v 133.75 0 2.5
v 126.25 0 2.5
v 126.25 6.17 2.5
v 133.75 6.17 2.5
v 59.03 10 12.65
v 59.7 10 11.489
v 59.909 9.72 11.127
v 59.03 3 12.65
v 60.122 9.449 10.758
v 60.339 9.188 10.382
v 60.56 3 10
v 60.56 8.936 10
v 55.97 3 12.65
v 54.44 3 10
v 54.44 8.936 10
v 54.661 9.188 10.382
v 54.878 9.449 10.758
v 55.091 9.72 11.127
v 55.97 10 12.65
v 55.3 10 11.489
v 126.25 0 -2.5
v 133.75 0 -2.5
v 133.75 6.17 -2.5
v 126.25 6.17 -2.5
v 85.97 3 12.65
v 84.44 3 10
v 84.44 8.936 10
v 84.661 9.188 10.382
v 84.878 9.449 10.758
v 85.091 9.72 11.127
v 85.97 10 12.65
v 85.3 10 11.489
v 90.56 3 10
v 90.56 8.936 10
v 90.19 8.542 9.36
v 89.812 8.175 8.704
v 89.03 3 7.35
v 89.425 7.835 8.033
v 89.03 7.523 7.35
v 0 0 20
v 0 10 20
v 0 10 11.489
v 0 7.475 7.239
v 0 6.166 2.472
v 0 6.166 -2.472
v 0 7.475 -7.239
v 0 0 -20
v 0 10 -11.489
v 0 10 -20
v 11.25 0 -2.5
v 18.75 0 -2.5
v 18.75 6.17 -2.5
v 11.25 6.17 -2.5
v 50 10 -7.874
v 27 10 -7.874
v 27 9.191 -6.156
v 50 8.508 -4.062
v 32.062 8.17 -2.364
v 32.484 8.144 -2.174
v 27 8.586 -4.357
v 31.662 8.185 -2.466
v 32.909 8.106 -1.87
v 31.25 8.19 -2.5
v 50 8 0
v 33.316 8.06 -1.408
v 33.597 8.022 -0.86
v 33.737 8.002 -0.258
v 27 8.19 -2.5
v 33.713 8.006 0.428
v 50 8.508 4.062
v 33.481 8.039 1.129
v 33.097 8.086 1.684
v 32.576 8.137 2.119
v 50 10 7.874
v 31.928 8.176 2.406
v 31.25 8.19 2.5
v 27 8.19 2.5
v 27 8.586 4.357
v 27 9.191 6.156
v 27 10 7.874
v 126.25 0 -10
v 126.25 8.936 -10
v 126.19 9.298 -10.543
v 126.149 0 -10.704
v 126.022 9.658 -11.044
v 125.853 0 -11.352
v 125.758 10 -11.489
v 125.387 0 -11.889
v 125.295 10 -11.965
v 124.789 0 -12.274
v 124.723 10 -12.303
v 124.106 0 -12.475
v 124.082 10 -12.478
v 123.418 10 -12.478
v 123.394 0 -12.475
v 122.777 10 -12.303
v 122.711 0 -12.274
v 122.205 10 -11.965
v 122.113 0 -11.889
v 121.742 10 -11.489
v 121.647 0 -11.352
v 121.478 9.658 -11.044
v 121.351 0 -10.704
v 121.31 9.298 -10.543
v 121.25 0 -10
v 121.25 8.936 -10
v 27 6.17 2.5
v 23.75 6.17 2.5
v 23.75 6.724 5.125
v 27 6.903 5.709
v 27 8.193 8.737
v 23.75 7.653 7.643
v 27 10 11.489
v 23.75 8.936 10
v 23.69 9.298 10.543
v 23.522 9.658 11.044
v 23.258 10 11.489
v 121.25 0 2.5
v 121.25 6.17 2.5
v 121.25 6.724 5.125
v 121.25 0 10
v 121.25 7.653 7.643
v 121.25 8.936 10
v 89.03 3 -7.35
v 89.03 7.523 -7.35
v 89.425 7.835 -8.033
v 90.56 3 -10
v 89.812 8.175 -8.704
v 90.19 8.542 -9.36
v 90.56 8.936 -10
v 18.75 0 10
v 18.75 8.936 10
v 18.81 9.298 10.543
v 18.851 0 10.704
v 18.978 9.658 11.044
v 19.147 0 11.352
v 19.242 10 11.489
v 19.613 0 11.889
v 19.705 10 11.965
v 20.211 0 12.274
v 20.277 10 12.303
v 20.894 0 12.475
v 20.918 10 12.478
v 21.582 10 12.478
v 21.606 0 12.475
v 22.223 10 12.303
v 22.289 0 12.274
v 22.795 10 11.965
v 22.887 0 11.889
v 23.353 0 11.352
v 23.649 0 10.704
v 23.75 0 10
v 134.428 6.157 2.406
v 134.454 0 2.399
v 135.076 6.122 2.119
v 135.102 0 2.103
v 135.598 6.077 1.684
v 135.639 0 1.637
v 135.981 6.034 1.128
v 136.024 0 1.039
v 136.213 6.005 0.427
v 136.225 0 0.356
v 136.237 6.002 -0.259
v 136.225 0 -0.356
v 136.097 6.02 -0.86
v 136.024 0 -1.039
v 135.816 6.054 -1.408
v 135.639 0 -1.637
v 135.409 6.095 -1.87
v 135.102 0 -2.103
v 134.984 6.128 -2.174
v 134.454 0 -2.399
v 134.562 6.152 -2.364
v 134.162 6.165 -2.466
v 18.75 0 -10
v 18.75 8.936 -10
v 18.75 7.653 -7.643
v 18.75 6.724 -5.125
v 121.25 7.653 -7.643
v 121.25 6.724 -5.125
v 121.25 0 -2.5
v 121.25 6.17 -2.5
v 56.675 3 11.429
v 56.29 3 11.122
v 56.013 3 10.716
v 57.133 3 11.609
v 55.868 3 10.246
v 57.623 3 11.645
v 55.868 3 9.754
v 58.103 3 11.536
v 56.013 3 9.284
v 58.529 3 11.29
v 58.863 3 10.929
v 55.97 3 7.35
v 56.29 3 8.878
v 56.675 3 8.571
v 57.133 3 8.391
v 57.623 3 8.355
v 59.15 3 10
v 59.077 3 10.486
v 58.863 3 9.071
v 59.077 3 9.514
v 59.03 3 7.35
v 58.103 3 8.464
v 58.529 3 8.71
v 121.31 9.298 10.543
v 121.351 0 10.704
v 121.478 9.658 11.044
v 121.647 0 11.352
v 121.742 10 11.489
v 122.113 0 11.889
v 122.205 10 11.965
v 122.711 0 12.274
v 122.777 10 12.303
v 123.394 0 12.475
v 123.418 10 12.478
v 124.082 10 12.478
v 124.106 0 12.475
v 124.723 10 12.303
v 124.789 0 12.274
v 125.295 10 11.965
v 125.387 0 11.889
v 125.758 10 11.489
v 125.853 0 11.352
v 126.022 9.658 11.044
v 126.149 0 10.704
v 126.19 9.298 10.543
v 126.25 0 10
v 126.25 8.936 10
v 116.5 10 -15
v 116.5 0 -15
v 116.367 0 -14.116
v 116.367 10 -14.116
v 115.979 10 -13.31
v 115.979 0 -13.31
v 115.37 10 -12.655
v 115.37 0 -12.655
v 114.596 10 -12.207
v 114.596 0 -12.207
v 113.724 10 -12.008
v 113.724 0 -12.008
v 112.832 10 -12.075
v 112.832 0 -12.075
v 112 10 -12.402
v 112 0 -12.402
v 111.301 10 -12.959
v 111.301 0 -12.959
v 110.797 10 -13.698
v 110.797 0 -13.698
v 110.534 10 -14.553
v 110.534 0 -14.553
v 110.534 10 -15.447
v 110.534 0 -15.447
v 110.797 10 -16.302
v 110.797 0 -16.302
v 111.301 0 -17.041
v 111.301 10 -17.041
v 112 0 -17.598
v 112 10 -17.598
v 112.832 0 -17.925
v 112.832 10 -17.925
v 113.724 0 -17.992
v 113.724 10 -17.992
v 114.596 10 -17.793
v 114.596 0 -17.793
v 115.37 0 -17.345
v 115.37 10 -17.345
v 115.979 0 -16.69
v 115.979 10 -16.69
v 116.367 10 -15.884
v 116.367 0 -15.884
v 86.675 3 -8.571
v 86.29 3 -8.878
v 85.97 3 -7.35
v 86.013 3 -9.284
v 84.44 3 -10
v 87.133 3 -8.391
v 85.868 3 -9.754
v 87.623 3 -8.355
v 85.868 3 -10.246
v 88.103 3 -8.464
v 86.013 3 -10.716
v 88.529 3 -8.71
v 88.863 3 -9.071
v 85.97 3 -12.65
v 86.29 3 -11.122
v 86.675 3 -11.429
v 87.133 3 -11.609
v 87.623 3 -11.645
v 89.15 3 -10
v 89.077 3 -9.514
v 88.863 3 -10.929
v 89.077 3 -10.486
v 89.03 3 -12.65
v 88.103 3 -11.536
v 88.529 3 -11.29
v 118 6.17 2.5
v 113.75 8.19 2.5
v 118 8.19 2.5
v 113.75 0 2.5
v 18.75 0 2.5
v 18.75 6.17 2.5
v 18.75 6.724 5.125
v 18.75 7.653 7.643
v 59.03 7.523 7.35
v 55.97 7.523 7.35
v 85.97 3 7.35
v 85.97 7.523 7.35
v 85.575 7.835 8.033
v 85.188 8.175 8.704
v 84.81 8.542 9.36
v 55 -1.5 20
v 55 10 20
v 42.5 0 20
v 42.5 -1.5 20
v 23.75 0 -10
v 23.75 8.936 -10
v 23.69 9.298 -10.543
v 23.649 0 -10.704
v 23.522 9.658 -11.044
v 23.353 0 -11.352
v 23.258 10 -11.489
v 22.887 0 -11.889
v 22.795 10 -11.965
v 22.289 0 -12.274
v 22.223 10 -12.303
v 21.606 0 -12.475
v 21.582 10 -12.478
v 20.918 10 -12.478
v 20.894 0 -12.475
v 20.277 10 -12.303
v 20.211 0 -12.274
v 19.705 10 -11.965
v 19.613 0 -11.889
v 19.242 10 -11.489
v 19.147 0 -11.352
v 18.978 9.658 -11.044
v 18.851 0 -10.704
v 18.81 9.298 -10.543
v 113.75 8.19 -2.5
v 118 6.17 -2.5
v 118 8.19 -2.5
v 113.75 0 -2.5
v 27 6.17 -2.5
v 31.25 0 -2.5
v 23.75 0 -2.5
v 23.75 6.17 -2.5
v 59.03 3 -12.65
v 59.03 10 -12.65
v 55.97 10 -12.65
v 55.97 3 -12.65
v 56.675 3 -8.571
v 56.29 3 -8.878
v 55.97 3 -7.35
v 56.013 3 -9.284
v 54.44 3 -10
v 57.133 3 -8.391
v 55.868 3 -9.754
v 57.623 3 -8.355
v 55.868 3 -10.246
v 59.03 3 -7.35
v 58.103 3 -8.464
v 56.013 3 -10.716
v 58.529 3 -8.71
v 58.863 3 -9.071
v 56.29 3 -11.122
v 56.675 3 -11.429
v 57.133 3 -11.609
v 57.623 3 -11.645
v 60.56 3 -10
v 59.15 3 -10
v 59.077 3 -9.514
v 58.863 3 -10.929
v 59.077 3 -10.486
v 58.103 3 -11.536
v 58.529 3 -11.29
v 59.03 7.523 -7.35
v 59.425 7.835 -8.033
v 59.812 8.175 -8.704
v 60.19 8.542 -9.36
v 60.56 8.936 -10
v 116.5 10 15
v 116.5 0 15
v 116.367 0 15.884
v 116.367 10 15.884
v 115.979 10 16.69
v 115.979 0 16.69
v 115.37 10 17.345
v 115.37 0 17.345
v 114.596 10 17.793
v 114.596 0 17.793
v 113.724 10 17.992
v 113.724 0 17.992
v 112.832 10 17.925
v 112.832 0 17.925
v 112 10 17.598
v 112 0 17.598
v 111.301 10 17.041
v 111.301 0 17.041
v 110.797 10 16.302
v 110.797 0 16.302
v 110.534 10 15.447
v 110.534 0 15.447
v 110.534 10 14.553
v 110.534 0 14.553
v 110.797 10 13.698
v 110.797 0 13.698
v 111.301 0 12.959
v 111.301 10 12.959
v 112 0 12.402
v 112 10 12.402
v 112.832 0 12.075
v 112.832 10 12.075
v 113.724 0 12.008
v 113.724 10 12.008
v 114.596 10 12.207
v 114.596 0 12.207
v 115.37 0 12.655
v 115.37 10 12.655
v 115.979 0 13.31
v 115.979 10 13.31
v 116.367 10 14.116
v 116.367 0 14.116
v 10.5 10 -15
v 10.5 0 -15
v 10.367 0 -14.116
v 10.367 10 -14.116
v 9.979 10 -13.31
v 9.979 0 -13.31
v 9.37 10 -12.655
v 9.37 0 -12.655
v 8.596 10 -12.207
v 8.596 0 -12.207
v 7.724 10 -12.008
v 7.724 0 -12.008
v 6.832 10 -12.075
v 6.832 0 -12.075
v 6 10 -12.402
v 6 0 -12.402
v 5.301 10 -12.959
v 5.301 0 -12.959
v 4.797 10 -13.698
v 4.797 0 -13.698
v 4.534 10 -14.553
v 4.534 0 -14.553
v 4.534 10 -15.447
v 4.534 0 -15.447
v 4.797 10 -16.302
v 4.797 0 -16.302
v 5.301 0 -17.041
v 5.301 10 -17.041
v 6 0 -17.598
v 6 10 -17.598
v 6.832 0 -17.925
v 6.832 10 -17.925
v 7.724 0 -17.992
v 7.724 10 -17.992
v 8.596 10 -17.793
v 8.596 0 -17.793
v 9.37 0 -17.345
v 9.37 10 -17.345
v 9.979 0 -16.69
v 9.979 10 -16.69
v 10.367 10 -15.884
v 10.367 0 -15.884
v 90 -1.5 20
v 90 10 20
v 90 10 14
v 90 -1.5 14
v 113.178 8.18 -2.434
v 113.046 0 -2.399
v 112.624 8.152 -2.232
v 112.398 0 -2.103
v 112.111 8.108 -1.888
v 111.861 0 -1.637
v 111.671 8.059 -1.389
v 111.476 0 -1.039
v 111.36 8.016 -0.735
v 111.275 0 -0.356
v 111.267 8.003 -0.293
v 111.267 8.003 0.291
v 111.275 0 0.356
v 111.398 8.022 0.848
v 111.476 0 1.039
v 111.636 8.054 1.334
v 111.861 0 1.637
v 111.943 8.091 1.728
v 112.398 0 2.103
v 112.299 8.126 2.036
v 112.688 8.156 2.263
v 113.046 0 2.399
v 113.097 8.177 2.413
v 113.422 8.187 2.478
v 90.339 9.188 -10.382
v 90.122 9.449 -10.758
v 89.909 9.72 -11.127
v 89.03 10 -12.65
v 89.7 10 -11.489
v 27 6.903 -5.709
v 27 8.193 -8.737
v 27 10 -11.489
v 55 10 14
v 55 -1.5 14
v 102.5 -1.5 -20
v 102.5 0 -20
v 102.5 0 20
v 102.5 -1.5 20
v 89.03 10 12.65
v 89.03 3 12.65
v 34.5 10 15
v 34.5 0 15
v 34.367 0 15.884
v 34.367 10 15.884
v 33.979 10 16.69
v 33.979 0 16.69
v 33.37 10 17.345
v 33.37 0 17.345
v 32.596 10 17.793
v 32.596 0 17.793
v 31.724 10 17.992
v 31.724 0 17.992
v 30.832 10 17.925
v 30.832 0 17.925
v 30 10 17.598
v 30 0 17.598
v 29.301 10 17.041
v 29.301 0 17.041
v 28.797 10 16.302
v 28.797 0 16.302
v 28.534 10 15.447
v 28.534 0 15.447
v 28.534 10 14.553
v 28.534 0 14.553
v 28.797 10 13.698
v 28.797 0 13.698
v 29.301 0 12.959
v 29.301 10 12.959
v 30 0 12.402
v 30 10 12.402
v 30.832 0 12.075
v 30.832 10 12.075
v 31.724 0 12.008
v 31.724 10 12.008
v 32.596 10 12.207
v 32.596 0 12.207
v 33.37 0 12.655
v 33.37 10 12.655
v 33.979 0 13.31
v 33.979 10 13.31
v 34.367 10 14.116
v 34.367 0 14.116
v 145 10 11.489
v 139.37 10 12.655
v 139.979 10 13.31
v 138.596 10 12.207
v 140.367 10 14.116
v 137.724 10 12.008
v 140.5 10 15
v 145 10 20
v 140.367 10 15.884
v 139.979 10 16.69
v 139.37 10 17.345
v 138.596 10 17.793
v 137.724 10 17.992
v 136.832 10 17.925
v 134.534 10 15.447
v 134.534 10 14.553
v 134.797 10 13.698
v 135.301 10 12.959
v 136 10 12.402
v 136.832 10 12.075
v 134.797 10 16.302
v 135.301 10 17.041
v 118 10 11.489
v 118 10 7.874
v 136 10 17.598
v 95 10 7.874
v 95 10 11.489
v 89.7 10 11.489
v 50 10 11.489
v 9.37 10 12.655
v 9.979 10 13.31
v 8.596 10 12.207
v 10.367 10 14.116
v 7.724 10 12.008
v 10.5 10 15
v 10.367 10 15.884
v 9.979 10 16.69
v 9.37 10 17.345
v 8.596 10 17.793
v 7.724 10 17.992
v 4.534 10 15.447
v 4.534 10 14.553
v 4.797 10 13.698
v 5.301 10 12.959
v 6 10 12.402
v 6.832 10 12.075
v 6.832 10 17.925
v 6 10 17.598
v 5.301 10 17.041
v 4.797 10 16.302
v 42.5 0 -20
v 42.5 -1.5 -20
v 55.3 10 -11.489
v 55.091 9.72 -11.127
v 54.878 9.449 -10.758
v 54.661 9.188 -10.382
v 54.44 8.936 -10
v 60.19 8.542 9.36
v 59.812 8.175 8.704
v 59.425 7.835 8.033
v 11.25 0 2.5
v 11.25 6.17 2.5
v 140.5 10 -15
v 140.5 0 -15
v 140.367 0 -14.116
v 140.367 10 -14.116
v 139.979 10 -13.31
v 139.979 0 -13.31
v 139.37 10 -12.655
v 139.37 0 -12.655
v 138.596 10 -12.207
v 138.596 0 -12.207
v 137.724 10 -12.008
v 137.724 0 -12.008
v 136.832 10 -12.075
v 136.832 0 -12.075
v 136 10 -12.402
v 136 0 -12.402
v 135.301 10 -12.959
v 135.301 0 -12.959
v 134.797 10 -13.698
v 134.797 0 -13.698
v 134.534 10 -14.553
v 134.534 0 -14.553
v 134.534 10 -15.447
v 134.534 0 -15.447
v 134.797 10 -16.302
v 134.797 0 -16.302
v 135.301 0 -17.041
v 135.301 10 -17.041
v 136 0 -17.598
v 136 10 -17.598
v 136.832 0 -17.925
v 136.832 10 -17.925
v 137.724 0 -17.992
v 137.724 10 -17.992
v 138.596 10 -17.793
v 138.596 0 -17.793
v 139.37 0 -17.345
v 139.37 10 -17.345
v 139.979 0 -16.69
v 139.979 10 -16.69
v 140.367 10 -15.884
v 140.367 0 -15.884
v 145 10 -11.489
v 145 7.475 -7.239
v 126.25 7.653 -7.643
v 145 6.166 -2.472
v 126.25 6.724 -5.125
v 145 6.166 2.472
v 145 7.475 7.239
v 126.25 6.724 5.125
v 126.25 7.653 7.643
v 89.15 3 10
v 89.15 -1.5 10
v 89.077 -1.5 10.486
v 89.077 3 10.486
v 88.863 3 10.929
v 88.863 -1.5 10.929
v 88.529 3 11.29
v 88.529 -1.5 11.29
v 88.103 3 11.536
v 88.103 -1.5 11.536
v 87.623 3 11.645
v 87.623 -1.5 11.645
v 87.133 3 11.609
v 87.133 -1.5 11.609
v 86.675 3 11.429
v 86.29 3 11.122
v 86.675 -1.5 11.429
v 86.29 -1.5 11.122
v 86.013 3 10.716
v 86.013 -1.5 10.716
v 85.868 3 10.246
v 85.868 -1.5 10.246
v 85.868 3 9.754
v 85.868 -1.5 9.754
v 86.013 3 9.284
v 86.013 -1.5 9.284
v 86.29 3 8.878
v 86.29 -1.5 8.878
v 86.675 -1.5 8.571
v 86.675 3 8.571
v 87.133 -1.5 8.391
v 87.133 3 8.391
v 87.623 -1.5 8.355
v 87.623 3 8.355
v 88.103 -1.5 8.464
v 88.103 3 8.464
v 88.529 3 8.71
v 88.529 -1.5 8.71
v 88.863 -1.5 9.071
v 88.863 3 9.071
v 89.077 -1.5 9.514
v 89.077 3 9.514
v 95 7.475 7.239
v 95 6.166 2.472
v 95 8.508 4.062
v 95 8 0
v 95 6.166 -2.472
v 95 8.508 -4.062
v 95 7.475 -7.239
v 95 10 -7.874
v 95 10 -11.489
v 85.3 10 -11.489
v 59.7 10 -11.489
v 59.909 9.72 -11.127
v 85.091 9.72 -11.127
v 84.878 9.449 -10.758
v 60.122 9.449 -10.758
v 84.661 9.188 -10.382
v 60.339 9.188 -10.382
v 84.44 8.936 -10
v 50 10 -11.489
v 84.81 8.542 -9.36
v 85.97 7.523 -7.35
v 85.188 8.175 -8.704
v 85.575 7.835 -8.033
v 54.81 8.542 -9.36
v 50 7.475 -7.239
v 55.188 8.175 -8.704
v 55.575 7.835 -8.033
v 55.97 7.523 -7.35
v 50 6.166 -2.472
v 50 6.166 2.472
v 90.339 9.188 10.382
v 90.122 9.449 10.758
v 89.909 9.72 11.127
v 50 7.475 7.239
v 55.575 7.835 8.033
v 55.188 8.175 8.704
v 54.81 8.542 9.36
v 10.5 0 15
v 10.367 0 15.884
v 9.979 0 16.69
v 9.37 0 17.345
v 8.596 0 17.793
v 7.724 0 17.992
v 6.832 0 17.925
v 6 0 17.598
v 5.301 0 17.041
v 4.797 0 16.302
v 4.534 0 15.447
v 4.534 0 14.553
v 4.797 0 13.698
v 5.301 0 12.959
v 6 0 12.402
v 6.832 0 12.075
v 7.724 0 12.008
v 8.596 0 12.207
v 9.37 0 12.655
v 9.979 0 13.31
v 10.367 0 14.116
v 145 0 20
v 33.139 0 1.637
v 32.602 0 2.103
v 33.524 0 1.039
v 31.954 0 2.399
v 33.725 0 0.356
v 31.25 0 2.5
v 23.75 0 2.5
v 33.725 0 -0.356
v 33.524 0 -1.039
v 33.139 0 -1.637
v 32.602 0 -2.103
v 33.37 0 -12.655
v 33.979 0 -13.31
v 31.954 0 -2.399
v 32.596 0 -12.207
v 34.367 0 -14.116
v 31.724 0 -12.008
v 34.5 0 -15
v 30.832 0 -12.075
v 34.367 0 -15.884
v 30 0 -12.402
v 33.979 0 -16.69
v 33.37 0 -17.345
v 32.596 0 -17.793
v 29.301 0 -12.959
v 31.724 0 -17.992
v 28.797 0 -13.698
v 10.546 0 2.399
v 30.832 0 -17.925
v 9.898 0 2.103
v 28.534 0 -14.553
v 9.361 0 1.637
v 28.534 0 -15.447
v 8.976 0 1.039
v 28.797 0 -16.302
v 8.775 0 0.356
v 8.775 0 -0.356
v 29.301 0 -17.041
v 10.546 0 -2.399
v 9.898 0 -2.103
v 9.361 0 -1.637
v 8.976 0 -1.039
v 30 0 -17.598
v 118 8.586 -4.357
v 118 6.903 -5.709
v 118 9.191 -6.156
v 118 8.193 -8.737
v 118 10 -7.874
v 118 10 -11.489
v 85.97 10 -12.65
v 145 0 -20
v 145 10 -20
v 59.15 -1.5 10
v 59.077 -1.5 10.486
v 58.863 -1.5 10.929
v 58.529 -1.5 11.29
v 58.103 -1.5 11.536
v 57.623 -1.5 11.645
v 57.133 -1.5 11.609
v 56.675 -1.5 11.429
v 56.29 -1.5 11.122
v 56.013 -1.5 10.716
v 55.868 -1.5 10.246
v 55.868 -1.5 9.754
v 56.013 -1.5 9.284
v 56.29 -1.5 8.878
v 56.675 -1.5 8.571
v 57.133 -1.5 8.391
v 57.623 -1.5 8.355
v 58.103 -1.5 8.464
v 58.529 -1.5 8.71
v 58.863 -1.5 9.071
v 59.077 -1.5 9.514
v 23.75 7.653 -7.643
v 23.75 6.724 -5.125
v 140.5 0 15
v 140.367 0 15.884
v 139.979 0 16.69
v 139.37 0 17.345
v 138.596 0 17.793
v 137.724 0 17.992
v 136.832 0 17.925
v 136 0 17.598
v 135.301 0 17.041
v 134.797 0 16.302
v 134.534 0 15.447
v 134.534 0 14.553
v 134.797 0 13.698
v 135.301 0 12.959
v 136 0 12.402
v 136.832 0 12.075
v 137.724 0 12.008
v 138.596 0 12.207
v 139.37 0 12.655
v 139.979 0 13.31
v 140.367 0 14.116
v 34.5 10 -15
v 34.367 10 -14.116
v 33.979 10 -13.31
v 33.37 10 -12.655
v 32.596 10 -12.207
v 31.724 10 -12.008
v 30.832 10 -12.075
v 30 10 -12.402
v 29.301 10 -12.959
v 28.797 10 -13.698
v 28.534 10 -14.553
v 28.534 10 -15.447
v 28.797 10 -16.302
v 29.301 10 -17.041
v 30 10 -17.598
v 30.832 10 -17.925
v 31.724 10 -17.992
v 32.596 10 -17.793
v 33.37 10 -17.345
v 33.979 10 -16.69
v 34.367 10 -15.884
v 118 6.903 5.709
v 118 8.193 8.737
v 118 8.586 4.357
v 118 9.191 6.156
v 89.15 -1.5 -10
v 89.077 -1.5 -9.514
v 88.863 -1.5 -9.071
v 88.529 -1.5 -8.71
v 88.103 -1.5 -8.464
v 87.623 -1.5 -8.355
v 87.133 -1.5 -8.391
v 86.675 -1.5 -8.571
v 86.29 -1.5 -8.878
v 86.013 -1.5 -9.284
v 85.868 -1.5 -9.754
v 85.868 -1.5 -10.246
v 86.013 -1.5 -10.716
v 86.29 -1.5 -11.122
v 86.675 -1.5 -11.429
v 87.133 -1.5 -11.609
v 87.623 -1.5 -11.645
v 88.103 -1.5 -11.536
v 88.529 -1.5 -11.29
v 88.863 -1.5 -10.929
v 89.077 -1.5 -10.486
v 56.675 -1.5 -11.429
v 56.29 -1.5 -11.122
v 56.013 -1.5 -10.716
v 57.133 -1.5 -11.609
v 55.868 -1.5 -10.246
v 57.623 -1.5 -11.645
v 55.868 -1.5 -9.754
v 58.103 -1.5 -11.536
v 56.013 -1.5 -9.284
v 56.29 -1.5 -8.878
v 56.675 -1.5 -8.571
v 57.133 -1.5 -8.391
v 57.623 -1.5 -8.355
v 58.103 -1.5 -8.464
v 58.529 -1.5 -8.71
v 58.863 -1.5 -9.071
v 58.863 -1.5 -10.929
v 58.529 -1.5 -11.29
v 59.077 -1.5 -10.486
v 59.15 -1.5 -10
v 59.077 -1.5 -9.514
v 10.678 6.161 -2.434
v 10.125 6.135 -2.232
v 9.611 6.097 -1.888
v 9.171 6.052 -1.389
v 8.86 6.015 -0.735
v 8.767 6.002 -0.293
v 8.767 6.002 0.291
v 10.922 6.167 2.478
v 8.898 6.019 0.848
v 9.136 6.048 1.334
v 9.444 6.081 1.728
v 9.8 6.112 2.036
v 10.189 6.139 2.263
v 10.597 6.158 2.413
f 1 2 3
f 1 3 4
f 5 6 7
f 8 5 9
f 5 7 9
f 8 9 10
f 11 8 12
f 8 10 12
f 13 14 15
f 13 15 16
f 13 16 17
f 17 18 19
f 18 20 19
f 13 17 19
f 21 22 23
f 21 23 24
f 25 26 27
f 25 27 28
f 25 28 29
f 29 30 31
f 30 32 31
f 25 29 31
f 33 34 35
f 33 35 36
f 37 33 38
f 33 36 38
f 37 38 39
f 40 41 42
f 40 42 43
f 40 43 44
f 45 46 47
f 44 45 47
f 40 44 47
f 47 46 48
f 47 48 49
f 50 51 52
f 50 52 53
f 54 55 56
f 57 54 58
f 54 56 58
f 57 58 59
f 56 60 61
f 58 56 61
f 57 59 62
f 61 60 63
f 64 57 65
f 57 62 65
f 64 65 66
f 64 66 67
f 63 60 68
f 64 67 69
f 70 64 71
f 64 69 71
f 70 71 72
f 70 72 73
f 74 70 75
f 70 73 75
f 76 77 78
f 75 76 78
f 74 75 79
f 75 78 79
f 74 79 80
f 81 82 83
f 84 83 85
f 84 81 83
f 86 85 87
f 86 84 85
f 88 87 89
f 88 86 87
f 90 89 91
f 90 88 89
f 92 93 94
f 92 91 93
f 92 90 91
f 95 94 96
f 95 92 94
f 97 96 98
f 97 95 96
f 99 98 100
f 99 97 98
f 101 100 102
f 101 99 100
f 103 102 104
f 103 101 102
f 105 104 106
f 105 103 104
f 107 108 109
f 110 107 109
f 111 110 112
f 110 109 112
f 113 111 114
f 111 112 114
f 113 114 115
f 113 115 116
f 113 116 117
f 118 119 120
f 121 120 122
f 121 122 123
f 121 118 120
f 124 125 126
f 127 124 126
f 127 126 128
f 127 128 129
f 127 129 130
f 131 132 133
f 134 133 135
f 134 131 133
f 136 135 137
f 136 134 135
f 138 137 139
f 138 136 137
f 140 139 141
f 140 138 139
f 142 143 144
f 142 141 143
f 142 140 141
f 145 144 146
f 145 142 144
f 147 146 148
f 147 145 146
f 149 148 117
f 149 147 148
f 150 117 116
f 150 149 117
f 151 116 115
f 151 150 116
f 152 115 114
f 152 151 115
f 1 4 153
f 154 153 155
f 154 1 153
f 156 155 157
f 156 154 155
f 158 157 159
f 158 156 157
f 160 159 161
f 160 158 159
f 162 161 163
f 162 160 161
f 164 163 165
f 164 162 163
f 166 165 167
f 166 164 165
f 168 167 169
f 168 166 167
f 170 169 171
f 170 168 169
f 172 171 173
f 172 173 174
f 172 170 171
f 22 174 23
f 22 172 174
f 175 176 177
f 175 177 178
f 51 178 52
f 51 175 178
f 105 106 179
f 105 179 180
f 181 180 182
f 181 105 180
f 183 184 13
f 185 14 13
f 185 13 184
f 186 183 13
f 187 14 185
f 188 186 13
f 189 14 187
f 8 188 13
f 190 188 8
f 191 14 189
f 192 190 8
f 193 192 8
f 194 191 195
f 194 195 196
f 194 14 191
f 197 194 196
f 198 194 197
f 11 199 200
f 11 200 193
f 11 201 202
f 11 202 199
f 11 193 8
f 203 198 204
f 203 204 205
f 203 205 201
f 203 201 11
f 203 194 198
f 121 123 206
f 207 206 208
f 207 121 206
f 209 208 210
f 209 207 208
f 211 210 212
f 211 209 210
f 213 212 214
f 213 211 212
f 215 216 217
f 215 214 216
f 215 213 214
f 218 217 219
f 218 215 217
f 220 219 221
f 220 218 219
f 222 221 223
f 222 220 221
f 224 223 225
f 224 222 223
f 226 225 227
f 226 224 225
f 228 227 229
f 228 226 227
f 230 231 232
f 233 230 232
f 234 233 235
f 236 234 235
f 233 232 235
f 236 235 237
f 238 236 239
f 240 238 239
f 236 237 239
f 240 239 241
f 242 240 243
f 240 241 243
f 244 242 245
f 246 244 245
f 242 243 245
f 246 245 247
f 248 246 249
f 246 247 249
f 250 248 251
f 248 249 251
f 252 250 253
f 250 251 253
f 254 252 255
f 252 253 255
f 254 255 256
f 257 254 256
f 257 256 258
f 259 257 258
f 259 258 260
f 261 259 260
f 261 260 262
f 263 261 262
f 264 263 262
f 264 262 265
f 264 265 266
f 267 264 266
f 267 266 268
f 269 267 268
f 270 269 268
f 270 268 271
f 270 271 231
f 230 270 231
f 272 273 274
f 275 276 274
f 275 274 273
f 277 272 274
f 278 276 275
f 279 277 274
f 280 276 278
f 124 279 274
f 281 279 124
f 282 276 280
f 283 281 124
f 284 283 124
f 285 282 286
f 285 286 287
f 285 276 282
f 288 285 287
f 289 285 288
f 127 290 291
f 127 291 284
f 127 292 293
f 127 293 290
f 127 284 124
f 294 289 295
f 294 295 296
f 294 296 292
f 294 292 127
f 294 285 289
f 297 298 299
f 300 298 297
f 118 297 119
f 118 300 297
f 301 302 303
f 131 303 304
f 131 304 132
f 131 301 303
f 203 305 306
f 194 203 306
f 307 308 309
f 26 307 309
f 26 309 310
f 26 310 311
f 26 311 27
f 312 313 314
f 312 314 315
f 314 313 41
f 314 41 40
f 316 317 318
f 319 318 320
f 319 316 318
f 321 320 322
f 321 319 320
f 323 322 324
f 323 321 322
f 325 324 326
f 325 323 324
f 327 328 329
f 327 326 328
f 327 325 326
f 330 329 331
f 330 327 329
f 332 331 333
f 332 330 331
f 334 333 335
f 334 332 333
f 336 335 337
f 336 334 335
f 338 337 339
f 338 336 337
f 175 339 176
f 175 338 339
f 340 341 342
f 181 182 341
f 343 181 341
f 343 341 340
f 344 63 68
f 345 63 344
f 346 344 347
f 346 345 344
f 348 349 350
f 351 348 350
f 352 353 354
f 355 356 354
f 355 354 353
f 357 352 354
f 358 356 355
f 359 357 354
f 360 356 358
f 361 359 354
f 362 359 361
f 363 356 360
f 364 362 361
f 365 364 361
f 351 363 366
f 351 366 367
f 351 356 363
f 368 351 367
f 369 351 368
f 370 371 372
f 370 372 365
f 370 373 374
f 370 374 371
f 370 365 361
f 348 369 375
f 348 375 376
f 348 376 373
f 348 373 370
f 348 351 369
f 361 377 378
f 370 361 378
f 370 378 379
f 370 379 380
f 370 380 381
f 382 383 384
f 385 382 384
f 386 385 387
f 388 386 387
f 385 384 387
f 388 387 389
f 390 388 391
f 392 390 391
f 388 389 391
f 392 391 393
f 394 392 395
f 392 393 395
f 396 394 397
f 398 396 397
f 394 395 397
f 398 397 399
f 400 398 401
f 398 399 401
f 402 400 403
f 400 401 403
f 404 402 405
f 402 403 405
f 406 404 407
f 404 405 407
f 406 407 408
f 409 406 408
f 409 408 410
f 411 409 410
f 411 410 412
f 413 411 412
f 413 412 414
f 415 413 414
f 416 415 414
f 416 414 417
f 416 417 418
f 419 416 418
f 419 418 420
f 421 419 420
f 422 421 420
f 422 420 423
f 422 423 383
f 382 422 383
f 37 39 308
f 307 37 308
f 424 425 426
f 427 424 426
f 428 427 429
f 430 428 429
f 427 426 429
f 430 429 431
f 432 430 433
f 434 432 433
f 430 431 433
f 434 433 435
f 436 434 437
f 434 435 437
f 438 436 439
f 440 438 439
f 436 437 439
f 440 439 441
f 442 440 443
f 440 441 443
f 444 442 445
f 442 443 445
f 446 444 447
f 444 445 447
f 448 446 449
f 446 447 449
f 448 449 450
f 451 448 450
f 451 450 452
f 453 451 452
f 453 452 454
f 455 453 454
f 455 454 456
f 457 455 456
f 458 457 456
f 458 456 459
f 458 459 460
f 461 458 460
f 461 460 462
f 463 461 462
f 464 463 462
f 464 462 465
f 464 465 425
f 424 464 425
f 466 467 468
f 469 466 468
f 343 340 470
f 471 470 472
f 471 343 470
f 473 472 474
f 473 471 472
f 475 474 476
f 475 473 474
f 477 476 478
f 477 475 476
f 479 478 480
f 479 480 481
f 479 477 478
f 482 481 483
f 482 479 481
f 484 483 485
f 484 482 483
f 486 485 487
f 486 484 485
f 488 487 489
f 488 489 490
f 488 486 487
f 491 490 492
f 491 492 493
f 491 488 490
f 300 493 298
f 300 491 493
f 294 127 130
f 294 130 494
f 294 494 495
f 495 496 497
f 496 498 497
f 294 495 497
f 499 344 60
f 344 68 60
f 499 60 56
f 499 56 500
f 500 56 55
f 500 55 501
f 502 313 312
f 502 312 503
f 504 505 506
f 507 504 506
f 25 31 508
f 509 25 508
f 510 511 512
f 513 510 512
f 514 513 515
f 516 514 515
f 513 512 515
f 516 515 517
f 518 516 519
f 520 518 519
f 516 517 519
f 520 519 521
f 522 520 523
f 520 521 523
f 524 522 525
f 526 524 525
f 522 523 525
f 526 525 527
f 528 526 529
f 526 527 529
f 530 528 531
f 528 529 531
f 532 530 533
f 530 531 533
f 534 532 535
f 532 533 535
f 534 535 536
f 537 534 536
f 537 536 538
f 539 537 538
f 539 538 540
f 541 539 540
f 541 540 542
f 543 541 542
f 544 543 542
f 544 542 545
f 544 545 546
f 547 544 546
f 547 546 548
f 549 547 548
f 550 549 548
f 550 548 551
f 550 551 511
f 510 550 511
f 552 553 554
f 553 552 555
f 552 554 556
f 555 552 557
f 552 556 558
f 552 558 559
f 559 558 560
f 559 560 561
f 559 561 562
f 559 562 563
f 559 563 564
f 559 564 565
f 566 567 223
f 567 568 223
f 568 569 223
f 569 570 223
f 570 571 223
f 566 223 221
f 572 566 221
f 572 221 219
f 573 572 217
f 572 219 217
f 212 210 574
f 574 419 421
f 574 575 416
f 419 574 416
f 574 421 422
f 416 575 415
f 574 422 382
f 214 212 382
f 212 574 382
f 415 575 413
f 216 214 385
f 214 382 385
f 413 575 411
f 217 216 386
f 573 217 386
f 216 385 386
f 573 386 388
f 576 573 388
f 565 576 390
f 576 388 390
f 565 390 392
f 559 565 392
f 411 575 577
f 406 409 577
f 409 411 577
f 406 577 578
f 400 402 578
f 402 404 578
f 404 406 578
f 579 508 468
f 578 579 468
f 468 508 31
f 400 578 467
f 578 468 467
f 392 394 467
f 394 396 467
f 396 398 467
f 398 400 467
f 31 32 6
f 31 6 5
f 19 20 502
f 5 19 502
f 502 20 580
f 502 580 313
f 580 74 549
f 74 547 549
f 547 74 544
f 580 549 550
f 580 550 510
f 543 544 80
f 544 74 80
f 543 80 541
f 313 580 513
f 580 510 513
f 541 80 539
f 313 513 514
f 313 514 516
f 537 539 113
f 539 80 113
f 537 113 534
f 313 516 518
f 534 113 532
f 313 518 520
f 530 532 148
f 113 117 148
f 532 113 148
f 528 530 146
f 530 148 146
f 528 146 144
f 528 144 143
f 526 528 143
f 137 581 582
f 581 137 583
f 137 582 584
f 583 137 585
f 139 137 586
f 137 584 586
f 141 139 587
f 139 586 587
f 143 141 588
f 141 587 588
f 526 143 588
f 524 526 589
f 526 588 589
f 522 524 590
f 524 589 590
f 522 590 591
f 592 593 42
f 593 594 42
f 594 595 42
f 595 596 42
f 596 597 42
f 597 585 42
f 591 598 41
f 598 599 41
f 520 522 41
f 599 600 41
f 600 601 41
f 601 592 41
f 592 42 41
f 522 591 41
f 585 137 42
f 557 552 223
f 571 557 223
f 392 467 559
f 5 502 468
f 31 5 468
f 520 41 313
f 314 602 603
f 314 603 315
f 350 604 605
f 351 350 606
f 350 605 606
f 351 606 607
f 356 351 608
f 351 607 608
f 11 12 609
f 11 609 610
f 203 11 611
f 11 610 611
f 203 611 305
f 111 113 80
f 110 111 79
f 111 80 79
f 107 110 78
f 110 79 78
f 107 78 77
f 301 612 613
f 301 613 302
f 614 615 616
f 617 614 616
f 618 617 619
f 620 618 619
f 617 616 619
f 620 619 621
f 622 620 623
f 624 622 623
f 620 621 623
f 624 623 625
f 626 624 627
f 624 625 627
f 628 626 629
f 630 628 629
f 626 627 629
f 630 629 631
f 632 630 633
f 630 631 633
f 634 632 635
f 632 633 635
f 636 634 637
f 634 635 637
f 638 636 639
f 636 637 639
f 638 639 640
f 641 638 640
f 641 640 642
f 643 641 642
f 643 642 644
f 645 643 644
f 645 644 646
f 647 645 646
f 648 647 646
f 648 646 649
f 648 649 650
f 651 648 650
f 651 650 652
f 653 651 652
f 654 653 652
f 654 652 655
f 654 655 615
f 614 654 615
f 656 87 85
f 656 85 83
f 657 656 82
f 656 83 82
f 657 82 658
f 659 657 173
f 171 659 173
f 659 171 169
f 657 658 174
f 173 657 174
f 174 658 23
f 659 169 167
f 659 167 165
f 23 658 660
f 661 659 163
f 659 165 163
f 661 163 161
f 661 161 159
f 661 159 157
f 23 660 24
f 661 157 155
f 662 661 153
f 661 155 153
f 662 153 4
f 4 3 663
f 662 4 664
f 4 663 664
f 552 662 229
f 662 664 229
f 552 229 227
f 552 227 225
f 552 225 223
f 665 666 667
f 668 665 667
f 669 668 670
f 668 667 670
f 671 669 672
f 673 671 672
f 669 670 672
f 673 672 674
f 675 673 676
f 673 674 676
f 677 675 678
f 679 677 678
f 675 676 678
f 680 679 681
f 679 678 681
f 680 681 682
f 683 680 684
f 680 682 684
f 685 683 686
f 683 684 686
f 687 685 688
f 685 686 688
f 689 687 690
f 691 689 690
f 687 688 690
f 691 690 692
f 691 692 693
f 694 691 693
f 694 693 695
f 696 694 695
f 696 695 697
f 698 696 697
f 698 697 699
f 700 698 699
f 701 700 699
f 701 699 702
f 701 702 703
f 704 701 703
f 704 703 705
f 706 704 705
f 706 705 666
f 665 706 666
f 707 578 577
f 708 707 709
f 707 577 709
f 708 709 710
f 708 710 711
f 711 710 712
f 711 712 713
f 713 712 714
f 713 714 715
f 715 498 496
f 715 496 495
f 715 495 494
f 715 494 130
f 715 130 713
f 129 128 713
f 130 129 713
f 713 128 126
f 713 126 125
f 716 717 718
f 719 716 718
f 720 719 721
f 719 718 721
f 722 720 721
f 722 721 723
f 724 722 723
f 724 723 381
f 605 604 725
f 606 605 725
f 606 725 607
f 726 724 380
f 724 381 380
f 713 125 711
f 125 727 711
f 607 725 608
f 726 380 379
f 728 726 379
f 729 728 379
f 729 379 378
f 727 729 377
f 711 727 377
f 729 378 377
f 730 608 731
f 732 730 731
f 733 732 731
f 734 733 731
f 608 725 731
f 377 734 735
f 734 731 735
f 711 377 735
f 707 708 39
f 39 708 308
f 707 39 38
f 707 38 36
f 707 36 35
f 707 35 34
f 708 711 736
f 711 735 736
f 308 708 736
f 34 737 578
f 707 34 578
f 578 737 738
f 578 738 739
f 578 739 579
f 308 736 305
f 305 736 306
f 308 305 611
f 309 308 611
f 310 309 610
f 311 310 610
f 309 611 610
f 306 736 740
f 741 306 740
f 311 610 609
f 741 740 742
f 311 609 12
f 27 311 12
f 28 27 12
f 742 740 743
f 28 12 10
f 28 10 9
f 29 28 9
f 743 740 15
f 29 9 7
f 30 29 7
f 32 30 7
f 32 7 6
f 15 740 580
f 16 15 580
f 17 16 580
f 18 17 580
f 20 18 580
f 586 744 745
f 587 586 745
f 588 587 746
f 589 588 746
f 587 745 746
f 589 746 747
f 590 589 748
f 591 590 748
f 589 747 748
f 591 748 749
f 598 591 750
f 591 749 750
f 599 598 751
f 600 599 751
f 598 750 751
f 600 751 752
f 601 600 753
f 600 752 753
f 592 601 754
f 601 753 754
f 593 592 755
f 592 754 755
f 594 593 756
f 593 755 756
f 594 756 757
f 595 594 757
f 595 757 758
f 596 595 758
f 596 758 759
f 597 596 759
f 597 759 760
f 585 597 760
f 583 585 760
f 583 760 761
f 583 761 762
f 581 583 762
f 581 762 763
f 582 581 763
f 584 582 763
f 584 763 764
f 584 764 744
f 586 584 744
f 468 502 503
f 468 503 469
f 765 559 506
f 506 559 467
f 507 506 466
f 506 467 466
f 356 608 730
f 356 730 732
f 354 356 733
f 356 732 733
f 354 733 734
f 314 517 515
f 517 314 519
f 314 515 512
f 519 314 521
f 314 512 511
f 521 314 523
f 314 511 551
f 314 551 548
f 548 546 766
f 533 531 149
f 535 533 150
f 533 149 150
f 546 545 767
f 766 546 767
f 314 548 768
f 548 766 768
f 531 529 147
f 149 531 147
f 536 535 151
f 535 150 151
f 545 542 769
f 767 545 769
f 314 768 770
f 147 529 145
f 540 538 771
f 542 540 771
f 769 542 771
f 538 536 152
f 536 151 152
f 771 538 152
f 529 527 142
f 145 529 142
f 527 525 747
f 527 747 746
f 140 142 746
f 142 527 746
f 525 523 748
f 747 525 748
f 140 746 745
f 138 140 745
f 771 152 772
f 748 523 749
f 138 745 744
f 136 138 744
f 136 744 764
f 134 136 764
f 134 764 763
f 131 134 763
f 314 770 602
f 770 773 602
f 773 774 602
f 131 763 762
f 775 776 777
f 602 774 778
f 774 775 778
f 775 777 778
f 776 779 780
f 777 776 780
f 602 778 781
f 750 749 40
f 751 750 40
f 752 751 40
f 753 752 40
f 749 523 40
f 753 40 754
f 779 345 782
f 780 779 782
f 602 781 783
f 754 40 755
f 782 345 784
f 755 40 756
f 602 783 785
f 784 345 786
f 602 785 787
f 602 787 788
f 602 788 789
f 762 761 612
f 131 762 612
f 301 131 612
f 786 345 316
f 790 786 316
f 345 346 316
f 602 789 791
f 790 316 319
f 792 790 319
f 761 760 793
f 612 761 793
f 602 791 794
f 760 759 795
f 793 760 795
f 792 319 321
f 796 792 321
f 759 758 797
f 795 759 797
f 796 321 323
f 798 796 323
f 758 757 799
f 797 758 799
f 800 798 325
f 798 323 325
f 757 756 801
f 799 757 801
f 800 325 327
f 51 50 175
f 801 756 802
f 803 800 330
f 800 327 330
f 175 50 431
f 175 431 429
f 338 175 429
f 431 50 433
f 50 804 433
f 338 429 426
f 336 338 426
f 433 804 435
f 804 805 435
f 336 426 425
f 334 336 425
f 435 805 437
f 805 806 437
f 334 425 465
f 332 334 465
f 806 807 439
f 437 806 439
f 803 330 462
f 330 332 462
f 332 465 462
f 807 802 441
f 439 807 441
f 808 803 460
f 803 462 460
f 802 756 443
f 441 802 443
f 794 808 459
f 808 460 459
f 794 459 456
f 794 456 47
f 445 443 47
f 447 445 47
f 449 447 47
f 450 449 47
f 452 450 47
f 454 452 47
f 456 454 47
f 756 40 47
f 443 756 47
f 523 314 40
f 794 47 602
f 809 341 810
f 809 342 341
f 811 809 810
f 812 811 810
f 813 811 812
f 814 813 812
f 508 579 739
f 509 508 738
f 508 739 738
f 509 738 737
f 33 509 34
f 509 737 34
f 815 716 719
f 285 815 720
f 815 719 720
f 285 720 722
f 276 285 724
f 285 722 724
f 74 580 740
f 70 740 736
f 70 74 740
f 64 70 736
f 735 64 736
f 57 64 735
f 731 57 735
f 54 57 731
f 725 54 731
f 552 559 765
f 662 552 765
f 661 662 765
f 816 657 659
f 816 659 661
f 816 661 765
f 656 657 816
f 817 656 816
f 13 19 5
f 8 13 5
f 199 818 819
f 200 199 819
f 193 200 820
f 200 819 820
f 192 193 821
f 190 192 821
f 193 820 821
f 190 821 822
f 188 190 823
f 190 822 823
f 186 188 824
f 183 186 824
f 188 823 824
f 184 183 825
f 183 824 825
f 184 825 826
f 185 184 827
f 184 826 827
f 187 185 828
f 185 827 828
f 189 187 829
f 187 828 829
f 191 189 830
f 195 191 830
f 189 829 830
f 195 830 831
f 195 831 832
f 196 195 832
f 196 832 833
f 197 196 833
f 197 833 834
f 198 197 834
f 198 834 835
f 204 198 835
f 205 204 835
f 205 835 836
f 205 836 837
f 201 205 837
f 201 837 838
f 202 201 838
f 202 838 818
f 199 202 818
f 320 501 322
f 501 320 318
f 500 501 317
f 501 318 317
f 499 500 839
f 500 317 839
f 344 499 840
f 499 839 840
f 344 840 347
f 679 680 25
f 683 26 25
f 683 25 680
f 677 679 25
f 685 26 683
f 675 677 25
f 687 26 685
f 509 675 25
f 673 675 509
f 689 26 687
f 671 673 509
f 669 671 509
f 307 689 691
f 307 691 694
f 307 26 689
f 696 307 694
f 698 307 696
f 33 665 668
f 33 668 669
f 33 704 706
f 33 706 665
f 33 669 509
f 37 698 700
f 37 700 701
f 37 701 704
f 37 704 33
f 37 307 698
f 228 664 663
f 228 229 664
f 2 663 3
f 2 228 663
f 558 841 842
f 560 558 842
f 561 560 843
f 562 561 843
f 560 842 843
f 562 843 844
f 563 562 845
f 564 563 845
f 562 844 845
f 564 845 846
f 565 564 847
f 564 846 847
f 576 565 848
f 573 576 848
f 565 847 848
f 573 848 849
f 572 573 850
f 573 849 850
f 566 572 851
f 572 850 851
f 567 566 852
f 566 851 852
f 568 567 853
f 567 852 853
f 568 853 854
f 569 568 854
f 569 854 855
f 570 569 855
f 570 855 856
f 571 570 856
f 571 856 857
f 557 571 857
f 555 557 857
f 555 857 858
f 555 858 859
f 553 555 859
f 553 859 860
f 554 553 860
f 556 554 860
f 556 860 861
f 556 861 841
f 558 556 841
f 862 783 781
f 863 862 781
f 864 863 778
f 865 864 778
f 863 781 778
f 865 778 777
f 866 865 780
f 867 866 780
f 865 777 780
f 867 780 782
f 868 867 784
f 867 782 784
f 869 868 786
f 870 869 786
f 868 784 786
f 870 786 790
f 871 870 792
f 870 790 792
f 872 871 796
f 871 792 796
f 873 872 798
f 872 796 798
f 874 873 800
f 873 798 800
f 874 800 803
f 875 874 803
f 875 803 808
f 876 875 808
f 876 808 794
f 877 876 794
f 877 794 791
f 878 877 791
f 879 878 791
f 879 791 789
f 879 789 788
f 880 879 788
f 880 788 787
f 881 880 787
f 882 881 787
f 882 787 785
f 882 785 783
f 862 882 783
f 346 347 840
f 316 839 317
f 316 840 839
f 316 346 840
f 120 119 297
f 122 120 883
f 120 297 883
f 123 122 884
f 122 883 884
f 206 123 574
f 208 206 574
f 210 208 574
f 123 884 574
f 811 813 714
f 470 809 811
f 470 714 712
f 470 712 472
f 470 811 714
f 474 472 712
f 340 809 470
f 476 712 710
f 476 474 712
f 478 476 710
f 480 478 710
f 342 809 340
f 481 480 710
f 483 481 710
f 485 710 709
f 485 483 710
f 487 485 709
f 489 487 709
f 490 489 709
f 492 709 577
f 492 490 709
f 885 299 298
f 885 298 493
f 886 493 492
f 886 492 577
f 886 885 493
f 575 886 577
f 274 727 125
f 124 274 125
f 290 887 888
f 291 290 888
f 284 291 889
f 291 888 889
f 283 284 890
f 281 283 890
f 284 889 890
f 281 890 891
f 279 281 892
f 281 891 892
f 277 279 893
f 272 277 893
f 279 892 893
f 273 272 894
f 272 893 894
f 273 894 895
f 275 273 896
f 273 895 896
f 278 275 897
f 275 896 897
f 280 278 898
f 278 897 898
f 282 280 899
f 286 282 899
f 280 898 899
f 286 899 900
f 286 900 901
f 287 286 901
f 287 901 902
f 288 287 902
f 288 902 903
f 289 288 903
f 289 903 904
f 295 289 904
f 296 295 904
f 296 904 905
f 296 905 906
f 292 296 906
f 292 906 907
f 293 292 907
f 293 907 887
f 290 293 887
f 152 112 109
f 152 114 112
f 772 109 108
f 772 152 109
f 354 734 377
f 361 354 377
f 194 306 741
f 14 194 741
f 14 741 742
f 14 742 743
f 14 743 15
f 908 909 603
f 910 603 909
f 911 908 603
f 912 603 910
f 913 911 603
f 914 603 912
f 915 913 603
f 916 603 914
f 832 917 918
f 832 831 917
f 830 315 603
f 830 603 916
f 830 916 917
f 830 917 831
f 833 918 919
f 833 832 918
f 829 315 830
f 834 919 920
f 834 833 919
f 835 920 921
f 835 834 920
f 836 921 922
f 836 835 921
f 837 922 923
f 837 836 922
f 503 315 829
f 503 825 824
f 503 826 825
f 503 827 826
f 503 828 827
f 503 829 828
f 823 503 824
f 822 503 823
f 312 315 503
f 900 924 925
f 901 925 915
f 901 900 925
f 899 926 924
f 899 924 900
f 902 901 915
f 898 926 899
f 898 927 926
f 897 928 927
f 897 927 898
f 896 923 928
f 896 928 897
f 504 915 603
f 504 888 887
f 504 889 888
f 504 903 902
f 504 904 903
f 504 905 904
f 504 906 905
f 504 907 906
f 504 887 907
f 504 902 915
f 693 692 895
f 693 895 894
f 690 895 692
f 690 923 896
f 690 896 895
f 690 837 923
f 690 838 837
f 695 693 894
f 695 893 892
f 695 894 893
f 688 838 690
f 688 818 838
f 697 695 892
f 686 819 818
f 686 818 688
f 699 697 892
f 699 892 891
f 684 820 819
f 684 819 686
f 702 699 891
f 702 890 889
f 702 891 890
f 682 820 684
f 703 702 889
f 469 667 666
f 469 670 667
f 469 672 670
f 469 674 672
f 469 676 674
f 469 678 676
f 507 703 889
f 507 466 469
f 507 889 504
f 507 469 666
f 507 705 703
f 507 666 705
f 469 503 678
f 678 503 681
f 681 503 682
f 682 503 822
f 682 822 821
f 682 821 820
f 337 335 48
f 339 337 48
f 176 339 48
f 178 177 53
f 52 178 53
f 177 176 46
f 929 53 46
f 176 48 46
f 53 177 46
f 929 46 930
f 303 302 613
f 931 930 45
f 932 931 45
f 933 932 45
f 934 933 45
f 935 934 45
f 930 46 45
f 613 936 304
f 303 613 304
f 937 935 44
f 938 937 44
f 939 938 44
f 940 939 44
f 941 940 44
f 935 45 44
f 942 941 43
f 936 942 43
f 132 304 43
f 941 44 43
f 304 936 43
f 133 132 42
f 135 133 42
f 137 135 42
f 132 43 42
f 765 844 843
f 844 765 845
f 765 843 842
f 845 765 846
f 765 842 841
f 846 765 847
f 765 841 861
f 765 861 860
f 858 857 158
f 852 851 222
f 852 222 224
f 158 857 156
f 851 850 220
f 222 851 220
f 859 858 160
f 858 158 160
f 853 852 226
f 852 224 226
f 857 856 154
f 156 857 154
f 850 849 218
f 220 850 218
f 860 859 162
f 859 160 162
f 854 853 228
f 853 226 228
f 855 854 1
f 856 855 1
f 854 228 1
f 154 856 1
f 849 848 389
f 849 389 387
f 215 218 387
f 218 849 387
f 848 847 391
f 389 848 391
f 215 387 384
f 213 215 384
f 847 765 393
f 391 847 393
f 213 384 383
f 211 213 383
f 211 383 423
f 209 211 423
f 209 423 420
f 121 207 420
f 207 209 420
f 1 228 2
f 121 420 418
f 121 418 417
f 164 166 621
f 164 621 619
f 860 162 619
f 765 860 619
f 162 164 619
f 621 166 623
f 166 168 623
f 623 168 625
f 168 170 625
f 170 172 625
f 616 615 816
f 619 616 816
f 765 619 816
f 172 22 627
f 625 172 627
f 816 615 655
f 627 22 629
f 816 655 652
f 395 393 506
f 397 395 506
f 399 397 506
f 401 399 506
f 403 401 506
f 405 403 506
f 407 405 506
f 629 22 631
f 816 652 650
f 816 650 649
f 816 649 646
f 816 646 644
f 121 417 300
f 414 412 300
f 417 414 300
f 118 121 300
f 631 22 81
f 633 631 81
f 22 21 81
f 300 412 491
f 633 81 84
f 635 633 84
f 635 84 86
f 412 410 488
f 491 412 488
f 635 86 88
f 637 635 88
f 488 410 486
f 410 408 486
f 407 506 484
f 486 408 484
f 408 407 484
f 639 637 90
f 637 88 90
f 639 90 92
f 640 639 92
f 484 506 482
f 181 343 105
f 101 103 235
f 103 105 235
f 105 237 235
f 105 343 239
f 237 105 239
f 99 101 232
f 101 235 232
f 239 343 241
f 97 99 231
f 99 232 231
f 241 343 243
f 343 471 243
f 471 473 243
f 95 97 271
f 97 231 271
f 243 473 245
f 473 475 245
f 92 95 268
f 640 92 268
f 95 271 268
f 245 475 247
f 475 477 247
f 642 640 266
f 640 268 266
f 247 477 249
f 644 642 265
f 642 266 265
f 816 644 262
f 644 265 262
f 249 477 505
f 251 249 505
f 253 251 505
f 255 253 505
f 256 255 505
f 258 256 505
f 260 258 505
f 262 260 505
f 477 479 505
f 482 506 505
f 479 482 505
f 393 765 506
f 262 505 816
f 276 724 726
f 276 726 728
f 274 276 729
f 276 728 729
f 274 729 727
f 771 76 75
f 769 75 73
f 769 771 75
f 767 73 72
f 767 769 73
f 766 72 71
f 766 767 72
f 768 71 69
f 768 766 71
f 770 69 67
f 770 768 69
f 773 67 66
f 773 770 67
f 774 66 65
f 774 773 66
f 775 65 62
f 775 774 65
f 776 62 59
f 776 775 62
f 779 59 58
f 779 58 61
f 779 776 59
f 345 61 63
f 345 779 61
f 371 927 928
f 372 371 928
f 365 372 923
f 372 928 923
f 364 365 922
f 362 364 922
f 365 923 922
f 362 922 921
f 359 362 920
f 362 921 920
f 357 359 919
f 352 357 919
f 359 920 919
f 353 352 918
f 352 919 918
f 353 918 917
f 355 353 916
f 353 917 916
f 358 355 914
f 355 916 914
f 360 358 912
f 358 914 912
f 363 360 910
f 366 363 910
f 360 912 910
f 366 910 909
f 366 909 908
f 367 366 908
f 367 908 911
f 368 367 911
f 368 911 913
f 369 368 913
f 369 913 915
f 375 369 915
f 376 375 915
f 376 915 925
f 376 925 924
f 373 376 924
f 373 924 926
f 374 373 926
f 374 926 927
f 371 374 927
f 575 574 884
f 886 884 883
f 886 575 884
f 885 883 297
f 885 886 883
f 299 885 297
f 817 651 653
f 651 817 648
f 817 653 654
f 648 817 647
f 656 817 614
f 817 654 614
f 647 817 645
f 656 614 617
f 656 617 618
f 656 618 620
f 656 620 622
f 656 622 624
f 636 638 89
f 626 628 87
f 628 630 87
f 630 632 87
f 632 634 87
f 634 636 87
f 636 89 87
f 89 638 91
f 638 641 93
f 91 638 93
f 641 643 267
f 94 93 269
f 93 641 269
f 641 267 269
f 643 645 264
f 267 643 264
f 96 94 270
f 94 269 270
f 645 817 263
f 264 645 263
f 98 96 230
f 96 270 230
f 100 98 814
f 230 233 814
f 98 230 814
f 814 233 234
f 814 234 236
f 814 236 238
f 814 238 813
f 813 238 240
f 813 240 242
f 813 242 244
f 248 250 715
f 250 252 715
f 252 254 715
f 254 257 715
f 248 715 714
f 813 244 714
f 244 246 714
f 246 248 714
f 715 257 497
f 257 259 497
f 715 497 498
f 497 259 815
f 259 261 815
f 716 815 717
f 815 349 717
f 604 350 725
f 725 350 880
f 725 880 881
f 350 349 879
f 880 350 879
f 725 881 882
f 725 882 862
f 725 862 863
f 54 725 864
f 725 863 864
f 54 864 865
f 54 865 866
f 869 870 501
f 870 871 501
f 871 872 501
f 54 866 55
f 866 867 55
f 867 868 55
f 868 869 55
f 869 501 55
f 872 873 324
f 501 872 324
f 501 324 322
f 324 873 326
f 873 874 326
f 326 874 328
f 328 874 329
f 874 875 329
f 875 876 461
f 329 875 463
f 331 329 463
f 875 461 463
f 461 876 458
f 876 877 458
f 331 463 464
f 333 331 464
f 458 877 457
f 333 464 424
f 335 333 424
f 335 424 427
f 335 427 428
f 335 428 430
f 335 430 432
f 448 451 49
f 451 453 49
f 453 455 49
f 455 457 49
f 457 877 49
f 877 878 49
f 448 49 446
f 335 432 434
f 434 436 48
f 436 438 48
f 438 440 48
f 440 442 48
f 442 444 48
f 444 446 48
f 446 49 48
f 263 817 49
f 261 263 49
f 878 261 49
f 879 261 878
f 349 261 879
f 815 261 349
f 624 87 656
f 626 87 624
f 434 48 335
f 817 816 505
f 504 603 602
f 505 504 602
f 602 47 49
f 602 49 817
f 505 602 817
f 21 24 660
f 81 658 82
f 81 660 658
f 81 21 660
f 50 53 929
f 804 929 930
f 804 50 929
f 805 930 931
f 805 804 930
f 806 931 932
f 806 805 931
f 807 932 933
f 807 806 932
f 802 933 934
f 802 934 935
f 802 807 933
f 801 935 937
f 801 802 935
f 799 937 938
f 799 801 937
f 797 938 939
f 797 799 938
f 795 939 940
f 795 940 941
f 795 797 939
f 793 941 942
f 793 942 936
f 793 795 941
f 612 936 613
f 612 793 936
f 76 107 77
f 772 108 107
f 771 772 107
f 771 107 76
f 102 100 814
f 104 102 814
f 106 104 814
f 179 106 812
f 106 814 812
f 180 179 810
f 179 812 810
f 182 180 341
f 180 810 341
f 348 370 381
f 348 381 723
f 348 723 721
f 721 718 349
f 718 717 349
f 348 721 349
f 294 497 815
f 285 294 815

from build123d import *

# Parameters (mm, degrees)
EXTRUDE_1_DEPTH     = 145
SKETCH_2_R          = 3
CUT_EXTRUDE_1_DEPTH = 11
EXTRUDE_2_DEPTH     = 23
SKETCH_4_W          = 60
SKETCH_4_H          = 40
EXTRUDE_3_DEPTH     = 1.5
SKETCH_5_R          = 1.65
CUT_EXTRUDE_2_DEPTH = 12.5
CUT_EXTRUDE_3_DEPTH = 7
SKETCH_8_W          = 35
SKETCH_8_H          = 6
CUT_EXTRUDE_5_DEPTH = 12.5
CUT_EXTRUDE_6_DEPTH = 11


with BuildPart() as part:
    # 草图1 → 凸台-拉伸1 (new body)
    with BuildSketch(Plane(origin=(0, 0, 0), x_dir=(0, 0, -1), z_dir=(1, 0, 0))):
        with BuildLine():
            Line((-20, 10), (-20, 0))
            Line((-20, 0), (20, 0))
            Line((20, 0), (20, 10))
            Line((20, 10), (11.489125293, 10))
            ThreePointArc((11.489125293, 10), (0, 6), (-11.489125293, 10))
            Line((-11.489125293, 10), (-20, 10))
        make_face()
    extrude(amount=EXTRUDE_1_DEPTH)

    # 草图2 → 切除-拉伸1 (cut, through all)
    with BuildSketch(Plane.XZ):
        with Locations((137.5, -15)):
            Circle(SKETCH_2_R)
        with Locations((113.5, -15)):
            Circle(SKETCH_2_R)
        with Locations((113.5, 15)):
            Circle(SKETCH_2_R)
        with Locations((137.5, 15)):
            Circle(SKETCH_2_R)
        with Locations((7.5, 15)):
            Circle(SKETCH_2_R)
        with Locations((31.5, 15)):
            Circle(SKETCH_2_R)
        with Locations((31.5, -15)):
            Circle(SKETCH_2_R)
        with Locations((7.5, -15)):
            Circle(SKETCH_2_R)
    extrude(amount=-CUT_EXTRUDE_1_DEPTH, mode=Mode.SUBTRACT)

    # 草图3 → 凸台-拉伸2 (add)
    with BuildSketch(Plane(origin=(27, 0, 0), x_dir=(0, 0, -1), z_dir=(1, 0, 0))):
        with BuildLine():
            Line((11.489125293, 10), (7.874007874, 10))
            ThreePointArc((7.874007874, 10), (0, 8), (-7.874007874, 10))
            Line((-7.874007874, 10), (-11.489125293, 10))
            ThreePointArc((-11.489125293, 10), (0, 6), (11.489125293, 10))
        make_face()
    extrude_2 = extrude(amount=EXTRUDE_2_DEPTH)

    # 镜向1: 凸台-拉伸2 across plane
    add(extrude_2.mirror(Plane(origin=(72.5, 0, 0), x_dir=(0, 0, 1), z_dir=(1, 0, 0))))

    # 草图4 → 凸台-拉伸3 (add)
    with BuildSketch(Plane.XZ):
        with Locations((72.5, 0)):
            Rectangle(SKETCH_4_W, SKETCH_4_H)
    extrude(amount=EXTRUDE_3_DEPTH)

    # 草图5 → 切除-拉伸2 (cut, through all)
    with BuildSketch(Plane.XZ.offset(1.5)):
        with Locations((57.5, 10)):
            Circle(SKETCH_5_R)
        with Locations((57.5, -10)):
            Circle(SKETCH_5_R)
        with Locations((87.5, -10)):
            Circle(SKETCH_5_R)
        with Locations((87.5, 10)):
            Circle(SKETCH_5_R)
    extrude(amount=-CUT_EXTRUDE_2_DEPTH, mode=Mode.SUBTRACT)

    # 草图6 → 切除-拉伸3 (cut)
    with BuildSketch(Plane(origin=(0, 10, 0), x_dir=(1, 0, 0), z_dir=(0, 1, 0))):
        Polygon((60.559956427, 10), (59.029978213, 12.65), (55.970021787, 12.65), (54.440043573, 10), (55.970021787, 7.35), (59.029978213, 7.35), align=None)
        Polygon((90.559956427, 10), (89.029978213, 12.65), (85.970021787, 12.65), (84.440043573, 10), (85.970021787, 7.35), (89.029978213, 7.35), align=None)
        Polygon((60.559956427, -10), (59.029978213, -7.35), (55.970021787, -7.35), (54.440043573, -10), (55.970021787, -12.65), (59.029978213, -12.65), align=None)
        Polygon((90.559956427, -10), (89.029978213, -7.35), (85.970021787, -7.35), (84.440043573, -10), (85.970021787, -12.65), (89.029978213, -12.65), align=None)
    extrude(amount=-CUT_EXTRUDE_3_DEPTH, mode=Mode.SUBTRACT)

    # 草图8 → 切除-拉伸5 (cut, through all)
    with BuildSketch(Plane(origin=(0, 10, 0), x_dir=(1, 0, 0), z_dir=(0, 1, 0))):
        with Locations((72.5, -17)):
            Rectangle(SKETCH_8_W, SKETCH_8_H)
    extrude(amount=-CUT_EXTRUDE_5_DEPTH, mode=Mode.SUBTRACT)

    # 草图9 → 切除-拉伸6 (cut, through all)
    with BuildSketch(Plane.XZ):
        with BuildLine():
            Line((133.75, -2.5), (126.25, -2.5))
            Line((126.25, -2.5), (126.25, -10))
            ThreePointArc((126.25, -10), (123.75, -12.5), (121.25, -10))
            Line((121.25, -10), (121.25, -2.5))
            Line((121.25, -2.5), (113.75, -2.5))
            ThreePointArc((113.75, -2.5), (111.25, 0), (113.75, 2.5))
            Line((113.75, 2.5), (121.25, 2.5))
            Line((121.25, 2.5), (121.25, 10))
            ThreePointArc((121.25, 10), (123.75, 12.5), (126.25, 10))
            Line((126.25, 10), (126.25, 2.5))
            Line((126.25, 2.5), (133.75, 2.5))
            ThreePointArc((133.75, 2.5), (136.25, 0), (133.75, -2.5))
        make_face()
        with BuildLine():
            Line((23.75, -2.5), (23.75, -10))
            ThreePointArc((23.75, -10), (21.25, -12.5), (18.75, -10))
            Line((18.75, -10), (18.75, -2.5))
            Line((18.75, -2.5), (11.25, -2.5))
            ThreePointArc((11.25, -2.5), (8.75, 0), (11.25, 2.5))
            Line((11.25, 2.5), (18.75, 2.5))
            Line((18.75, 2.5), (18.75, 10))
            ThreePointArc((18.75, 10), (21.25, 12.5), (23.75, 10))
            Line((23.75, 10), (23.75, 2.5))
            Line((23.75, 2.5), (31.25, 2.5))
            ThreePointArc((31.25, 2.5), (33.75, 0), (31.25, -2.5))
            Line((31.25, -2.5), (23.75, -2.5))
        make_face()
    extrude(amount=-CUT_EXTRUDE_6_DEPTH, mode=Mode.SUBTRACT)


solid = part.part
